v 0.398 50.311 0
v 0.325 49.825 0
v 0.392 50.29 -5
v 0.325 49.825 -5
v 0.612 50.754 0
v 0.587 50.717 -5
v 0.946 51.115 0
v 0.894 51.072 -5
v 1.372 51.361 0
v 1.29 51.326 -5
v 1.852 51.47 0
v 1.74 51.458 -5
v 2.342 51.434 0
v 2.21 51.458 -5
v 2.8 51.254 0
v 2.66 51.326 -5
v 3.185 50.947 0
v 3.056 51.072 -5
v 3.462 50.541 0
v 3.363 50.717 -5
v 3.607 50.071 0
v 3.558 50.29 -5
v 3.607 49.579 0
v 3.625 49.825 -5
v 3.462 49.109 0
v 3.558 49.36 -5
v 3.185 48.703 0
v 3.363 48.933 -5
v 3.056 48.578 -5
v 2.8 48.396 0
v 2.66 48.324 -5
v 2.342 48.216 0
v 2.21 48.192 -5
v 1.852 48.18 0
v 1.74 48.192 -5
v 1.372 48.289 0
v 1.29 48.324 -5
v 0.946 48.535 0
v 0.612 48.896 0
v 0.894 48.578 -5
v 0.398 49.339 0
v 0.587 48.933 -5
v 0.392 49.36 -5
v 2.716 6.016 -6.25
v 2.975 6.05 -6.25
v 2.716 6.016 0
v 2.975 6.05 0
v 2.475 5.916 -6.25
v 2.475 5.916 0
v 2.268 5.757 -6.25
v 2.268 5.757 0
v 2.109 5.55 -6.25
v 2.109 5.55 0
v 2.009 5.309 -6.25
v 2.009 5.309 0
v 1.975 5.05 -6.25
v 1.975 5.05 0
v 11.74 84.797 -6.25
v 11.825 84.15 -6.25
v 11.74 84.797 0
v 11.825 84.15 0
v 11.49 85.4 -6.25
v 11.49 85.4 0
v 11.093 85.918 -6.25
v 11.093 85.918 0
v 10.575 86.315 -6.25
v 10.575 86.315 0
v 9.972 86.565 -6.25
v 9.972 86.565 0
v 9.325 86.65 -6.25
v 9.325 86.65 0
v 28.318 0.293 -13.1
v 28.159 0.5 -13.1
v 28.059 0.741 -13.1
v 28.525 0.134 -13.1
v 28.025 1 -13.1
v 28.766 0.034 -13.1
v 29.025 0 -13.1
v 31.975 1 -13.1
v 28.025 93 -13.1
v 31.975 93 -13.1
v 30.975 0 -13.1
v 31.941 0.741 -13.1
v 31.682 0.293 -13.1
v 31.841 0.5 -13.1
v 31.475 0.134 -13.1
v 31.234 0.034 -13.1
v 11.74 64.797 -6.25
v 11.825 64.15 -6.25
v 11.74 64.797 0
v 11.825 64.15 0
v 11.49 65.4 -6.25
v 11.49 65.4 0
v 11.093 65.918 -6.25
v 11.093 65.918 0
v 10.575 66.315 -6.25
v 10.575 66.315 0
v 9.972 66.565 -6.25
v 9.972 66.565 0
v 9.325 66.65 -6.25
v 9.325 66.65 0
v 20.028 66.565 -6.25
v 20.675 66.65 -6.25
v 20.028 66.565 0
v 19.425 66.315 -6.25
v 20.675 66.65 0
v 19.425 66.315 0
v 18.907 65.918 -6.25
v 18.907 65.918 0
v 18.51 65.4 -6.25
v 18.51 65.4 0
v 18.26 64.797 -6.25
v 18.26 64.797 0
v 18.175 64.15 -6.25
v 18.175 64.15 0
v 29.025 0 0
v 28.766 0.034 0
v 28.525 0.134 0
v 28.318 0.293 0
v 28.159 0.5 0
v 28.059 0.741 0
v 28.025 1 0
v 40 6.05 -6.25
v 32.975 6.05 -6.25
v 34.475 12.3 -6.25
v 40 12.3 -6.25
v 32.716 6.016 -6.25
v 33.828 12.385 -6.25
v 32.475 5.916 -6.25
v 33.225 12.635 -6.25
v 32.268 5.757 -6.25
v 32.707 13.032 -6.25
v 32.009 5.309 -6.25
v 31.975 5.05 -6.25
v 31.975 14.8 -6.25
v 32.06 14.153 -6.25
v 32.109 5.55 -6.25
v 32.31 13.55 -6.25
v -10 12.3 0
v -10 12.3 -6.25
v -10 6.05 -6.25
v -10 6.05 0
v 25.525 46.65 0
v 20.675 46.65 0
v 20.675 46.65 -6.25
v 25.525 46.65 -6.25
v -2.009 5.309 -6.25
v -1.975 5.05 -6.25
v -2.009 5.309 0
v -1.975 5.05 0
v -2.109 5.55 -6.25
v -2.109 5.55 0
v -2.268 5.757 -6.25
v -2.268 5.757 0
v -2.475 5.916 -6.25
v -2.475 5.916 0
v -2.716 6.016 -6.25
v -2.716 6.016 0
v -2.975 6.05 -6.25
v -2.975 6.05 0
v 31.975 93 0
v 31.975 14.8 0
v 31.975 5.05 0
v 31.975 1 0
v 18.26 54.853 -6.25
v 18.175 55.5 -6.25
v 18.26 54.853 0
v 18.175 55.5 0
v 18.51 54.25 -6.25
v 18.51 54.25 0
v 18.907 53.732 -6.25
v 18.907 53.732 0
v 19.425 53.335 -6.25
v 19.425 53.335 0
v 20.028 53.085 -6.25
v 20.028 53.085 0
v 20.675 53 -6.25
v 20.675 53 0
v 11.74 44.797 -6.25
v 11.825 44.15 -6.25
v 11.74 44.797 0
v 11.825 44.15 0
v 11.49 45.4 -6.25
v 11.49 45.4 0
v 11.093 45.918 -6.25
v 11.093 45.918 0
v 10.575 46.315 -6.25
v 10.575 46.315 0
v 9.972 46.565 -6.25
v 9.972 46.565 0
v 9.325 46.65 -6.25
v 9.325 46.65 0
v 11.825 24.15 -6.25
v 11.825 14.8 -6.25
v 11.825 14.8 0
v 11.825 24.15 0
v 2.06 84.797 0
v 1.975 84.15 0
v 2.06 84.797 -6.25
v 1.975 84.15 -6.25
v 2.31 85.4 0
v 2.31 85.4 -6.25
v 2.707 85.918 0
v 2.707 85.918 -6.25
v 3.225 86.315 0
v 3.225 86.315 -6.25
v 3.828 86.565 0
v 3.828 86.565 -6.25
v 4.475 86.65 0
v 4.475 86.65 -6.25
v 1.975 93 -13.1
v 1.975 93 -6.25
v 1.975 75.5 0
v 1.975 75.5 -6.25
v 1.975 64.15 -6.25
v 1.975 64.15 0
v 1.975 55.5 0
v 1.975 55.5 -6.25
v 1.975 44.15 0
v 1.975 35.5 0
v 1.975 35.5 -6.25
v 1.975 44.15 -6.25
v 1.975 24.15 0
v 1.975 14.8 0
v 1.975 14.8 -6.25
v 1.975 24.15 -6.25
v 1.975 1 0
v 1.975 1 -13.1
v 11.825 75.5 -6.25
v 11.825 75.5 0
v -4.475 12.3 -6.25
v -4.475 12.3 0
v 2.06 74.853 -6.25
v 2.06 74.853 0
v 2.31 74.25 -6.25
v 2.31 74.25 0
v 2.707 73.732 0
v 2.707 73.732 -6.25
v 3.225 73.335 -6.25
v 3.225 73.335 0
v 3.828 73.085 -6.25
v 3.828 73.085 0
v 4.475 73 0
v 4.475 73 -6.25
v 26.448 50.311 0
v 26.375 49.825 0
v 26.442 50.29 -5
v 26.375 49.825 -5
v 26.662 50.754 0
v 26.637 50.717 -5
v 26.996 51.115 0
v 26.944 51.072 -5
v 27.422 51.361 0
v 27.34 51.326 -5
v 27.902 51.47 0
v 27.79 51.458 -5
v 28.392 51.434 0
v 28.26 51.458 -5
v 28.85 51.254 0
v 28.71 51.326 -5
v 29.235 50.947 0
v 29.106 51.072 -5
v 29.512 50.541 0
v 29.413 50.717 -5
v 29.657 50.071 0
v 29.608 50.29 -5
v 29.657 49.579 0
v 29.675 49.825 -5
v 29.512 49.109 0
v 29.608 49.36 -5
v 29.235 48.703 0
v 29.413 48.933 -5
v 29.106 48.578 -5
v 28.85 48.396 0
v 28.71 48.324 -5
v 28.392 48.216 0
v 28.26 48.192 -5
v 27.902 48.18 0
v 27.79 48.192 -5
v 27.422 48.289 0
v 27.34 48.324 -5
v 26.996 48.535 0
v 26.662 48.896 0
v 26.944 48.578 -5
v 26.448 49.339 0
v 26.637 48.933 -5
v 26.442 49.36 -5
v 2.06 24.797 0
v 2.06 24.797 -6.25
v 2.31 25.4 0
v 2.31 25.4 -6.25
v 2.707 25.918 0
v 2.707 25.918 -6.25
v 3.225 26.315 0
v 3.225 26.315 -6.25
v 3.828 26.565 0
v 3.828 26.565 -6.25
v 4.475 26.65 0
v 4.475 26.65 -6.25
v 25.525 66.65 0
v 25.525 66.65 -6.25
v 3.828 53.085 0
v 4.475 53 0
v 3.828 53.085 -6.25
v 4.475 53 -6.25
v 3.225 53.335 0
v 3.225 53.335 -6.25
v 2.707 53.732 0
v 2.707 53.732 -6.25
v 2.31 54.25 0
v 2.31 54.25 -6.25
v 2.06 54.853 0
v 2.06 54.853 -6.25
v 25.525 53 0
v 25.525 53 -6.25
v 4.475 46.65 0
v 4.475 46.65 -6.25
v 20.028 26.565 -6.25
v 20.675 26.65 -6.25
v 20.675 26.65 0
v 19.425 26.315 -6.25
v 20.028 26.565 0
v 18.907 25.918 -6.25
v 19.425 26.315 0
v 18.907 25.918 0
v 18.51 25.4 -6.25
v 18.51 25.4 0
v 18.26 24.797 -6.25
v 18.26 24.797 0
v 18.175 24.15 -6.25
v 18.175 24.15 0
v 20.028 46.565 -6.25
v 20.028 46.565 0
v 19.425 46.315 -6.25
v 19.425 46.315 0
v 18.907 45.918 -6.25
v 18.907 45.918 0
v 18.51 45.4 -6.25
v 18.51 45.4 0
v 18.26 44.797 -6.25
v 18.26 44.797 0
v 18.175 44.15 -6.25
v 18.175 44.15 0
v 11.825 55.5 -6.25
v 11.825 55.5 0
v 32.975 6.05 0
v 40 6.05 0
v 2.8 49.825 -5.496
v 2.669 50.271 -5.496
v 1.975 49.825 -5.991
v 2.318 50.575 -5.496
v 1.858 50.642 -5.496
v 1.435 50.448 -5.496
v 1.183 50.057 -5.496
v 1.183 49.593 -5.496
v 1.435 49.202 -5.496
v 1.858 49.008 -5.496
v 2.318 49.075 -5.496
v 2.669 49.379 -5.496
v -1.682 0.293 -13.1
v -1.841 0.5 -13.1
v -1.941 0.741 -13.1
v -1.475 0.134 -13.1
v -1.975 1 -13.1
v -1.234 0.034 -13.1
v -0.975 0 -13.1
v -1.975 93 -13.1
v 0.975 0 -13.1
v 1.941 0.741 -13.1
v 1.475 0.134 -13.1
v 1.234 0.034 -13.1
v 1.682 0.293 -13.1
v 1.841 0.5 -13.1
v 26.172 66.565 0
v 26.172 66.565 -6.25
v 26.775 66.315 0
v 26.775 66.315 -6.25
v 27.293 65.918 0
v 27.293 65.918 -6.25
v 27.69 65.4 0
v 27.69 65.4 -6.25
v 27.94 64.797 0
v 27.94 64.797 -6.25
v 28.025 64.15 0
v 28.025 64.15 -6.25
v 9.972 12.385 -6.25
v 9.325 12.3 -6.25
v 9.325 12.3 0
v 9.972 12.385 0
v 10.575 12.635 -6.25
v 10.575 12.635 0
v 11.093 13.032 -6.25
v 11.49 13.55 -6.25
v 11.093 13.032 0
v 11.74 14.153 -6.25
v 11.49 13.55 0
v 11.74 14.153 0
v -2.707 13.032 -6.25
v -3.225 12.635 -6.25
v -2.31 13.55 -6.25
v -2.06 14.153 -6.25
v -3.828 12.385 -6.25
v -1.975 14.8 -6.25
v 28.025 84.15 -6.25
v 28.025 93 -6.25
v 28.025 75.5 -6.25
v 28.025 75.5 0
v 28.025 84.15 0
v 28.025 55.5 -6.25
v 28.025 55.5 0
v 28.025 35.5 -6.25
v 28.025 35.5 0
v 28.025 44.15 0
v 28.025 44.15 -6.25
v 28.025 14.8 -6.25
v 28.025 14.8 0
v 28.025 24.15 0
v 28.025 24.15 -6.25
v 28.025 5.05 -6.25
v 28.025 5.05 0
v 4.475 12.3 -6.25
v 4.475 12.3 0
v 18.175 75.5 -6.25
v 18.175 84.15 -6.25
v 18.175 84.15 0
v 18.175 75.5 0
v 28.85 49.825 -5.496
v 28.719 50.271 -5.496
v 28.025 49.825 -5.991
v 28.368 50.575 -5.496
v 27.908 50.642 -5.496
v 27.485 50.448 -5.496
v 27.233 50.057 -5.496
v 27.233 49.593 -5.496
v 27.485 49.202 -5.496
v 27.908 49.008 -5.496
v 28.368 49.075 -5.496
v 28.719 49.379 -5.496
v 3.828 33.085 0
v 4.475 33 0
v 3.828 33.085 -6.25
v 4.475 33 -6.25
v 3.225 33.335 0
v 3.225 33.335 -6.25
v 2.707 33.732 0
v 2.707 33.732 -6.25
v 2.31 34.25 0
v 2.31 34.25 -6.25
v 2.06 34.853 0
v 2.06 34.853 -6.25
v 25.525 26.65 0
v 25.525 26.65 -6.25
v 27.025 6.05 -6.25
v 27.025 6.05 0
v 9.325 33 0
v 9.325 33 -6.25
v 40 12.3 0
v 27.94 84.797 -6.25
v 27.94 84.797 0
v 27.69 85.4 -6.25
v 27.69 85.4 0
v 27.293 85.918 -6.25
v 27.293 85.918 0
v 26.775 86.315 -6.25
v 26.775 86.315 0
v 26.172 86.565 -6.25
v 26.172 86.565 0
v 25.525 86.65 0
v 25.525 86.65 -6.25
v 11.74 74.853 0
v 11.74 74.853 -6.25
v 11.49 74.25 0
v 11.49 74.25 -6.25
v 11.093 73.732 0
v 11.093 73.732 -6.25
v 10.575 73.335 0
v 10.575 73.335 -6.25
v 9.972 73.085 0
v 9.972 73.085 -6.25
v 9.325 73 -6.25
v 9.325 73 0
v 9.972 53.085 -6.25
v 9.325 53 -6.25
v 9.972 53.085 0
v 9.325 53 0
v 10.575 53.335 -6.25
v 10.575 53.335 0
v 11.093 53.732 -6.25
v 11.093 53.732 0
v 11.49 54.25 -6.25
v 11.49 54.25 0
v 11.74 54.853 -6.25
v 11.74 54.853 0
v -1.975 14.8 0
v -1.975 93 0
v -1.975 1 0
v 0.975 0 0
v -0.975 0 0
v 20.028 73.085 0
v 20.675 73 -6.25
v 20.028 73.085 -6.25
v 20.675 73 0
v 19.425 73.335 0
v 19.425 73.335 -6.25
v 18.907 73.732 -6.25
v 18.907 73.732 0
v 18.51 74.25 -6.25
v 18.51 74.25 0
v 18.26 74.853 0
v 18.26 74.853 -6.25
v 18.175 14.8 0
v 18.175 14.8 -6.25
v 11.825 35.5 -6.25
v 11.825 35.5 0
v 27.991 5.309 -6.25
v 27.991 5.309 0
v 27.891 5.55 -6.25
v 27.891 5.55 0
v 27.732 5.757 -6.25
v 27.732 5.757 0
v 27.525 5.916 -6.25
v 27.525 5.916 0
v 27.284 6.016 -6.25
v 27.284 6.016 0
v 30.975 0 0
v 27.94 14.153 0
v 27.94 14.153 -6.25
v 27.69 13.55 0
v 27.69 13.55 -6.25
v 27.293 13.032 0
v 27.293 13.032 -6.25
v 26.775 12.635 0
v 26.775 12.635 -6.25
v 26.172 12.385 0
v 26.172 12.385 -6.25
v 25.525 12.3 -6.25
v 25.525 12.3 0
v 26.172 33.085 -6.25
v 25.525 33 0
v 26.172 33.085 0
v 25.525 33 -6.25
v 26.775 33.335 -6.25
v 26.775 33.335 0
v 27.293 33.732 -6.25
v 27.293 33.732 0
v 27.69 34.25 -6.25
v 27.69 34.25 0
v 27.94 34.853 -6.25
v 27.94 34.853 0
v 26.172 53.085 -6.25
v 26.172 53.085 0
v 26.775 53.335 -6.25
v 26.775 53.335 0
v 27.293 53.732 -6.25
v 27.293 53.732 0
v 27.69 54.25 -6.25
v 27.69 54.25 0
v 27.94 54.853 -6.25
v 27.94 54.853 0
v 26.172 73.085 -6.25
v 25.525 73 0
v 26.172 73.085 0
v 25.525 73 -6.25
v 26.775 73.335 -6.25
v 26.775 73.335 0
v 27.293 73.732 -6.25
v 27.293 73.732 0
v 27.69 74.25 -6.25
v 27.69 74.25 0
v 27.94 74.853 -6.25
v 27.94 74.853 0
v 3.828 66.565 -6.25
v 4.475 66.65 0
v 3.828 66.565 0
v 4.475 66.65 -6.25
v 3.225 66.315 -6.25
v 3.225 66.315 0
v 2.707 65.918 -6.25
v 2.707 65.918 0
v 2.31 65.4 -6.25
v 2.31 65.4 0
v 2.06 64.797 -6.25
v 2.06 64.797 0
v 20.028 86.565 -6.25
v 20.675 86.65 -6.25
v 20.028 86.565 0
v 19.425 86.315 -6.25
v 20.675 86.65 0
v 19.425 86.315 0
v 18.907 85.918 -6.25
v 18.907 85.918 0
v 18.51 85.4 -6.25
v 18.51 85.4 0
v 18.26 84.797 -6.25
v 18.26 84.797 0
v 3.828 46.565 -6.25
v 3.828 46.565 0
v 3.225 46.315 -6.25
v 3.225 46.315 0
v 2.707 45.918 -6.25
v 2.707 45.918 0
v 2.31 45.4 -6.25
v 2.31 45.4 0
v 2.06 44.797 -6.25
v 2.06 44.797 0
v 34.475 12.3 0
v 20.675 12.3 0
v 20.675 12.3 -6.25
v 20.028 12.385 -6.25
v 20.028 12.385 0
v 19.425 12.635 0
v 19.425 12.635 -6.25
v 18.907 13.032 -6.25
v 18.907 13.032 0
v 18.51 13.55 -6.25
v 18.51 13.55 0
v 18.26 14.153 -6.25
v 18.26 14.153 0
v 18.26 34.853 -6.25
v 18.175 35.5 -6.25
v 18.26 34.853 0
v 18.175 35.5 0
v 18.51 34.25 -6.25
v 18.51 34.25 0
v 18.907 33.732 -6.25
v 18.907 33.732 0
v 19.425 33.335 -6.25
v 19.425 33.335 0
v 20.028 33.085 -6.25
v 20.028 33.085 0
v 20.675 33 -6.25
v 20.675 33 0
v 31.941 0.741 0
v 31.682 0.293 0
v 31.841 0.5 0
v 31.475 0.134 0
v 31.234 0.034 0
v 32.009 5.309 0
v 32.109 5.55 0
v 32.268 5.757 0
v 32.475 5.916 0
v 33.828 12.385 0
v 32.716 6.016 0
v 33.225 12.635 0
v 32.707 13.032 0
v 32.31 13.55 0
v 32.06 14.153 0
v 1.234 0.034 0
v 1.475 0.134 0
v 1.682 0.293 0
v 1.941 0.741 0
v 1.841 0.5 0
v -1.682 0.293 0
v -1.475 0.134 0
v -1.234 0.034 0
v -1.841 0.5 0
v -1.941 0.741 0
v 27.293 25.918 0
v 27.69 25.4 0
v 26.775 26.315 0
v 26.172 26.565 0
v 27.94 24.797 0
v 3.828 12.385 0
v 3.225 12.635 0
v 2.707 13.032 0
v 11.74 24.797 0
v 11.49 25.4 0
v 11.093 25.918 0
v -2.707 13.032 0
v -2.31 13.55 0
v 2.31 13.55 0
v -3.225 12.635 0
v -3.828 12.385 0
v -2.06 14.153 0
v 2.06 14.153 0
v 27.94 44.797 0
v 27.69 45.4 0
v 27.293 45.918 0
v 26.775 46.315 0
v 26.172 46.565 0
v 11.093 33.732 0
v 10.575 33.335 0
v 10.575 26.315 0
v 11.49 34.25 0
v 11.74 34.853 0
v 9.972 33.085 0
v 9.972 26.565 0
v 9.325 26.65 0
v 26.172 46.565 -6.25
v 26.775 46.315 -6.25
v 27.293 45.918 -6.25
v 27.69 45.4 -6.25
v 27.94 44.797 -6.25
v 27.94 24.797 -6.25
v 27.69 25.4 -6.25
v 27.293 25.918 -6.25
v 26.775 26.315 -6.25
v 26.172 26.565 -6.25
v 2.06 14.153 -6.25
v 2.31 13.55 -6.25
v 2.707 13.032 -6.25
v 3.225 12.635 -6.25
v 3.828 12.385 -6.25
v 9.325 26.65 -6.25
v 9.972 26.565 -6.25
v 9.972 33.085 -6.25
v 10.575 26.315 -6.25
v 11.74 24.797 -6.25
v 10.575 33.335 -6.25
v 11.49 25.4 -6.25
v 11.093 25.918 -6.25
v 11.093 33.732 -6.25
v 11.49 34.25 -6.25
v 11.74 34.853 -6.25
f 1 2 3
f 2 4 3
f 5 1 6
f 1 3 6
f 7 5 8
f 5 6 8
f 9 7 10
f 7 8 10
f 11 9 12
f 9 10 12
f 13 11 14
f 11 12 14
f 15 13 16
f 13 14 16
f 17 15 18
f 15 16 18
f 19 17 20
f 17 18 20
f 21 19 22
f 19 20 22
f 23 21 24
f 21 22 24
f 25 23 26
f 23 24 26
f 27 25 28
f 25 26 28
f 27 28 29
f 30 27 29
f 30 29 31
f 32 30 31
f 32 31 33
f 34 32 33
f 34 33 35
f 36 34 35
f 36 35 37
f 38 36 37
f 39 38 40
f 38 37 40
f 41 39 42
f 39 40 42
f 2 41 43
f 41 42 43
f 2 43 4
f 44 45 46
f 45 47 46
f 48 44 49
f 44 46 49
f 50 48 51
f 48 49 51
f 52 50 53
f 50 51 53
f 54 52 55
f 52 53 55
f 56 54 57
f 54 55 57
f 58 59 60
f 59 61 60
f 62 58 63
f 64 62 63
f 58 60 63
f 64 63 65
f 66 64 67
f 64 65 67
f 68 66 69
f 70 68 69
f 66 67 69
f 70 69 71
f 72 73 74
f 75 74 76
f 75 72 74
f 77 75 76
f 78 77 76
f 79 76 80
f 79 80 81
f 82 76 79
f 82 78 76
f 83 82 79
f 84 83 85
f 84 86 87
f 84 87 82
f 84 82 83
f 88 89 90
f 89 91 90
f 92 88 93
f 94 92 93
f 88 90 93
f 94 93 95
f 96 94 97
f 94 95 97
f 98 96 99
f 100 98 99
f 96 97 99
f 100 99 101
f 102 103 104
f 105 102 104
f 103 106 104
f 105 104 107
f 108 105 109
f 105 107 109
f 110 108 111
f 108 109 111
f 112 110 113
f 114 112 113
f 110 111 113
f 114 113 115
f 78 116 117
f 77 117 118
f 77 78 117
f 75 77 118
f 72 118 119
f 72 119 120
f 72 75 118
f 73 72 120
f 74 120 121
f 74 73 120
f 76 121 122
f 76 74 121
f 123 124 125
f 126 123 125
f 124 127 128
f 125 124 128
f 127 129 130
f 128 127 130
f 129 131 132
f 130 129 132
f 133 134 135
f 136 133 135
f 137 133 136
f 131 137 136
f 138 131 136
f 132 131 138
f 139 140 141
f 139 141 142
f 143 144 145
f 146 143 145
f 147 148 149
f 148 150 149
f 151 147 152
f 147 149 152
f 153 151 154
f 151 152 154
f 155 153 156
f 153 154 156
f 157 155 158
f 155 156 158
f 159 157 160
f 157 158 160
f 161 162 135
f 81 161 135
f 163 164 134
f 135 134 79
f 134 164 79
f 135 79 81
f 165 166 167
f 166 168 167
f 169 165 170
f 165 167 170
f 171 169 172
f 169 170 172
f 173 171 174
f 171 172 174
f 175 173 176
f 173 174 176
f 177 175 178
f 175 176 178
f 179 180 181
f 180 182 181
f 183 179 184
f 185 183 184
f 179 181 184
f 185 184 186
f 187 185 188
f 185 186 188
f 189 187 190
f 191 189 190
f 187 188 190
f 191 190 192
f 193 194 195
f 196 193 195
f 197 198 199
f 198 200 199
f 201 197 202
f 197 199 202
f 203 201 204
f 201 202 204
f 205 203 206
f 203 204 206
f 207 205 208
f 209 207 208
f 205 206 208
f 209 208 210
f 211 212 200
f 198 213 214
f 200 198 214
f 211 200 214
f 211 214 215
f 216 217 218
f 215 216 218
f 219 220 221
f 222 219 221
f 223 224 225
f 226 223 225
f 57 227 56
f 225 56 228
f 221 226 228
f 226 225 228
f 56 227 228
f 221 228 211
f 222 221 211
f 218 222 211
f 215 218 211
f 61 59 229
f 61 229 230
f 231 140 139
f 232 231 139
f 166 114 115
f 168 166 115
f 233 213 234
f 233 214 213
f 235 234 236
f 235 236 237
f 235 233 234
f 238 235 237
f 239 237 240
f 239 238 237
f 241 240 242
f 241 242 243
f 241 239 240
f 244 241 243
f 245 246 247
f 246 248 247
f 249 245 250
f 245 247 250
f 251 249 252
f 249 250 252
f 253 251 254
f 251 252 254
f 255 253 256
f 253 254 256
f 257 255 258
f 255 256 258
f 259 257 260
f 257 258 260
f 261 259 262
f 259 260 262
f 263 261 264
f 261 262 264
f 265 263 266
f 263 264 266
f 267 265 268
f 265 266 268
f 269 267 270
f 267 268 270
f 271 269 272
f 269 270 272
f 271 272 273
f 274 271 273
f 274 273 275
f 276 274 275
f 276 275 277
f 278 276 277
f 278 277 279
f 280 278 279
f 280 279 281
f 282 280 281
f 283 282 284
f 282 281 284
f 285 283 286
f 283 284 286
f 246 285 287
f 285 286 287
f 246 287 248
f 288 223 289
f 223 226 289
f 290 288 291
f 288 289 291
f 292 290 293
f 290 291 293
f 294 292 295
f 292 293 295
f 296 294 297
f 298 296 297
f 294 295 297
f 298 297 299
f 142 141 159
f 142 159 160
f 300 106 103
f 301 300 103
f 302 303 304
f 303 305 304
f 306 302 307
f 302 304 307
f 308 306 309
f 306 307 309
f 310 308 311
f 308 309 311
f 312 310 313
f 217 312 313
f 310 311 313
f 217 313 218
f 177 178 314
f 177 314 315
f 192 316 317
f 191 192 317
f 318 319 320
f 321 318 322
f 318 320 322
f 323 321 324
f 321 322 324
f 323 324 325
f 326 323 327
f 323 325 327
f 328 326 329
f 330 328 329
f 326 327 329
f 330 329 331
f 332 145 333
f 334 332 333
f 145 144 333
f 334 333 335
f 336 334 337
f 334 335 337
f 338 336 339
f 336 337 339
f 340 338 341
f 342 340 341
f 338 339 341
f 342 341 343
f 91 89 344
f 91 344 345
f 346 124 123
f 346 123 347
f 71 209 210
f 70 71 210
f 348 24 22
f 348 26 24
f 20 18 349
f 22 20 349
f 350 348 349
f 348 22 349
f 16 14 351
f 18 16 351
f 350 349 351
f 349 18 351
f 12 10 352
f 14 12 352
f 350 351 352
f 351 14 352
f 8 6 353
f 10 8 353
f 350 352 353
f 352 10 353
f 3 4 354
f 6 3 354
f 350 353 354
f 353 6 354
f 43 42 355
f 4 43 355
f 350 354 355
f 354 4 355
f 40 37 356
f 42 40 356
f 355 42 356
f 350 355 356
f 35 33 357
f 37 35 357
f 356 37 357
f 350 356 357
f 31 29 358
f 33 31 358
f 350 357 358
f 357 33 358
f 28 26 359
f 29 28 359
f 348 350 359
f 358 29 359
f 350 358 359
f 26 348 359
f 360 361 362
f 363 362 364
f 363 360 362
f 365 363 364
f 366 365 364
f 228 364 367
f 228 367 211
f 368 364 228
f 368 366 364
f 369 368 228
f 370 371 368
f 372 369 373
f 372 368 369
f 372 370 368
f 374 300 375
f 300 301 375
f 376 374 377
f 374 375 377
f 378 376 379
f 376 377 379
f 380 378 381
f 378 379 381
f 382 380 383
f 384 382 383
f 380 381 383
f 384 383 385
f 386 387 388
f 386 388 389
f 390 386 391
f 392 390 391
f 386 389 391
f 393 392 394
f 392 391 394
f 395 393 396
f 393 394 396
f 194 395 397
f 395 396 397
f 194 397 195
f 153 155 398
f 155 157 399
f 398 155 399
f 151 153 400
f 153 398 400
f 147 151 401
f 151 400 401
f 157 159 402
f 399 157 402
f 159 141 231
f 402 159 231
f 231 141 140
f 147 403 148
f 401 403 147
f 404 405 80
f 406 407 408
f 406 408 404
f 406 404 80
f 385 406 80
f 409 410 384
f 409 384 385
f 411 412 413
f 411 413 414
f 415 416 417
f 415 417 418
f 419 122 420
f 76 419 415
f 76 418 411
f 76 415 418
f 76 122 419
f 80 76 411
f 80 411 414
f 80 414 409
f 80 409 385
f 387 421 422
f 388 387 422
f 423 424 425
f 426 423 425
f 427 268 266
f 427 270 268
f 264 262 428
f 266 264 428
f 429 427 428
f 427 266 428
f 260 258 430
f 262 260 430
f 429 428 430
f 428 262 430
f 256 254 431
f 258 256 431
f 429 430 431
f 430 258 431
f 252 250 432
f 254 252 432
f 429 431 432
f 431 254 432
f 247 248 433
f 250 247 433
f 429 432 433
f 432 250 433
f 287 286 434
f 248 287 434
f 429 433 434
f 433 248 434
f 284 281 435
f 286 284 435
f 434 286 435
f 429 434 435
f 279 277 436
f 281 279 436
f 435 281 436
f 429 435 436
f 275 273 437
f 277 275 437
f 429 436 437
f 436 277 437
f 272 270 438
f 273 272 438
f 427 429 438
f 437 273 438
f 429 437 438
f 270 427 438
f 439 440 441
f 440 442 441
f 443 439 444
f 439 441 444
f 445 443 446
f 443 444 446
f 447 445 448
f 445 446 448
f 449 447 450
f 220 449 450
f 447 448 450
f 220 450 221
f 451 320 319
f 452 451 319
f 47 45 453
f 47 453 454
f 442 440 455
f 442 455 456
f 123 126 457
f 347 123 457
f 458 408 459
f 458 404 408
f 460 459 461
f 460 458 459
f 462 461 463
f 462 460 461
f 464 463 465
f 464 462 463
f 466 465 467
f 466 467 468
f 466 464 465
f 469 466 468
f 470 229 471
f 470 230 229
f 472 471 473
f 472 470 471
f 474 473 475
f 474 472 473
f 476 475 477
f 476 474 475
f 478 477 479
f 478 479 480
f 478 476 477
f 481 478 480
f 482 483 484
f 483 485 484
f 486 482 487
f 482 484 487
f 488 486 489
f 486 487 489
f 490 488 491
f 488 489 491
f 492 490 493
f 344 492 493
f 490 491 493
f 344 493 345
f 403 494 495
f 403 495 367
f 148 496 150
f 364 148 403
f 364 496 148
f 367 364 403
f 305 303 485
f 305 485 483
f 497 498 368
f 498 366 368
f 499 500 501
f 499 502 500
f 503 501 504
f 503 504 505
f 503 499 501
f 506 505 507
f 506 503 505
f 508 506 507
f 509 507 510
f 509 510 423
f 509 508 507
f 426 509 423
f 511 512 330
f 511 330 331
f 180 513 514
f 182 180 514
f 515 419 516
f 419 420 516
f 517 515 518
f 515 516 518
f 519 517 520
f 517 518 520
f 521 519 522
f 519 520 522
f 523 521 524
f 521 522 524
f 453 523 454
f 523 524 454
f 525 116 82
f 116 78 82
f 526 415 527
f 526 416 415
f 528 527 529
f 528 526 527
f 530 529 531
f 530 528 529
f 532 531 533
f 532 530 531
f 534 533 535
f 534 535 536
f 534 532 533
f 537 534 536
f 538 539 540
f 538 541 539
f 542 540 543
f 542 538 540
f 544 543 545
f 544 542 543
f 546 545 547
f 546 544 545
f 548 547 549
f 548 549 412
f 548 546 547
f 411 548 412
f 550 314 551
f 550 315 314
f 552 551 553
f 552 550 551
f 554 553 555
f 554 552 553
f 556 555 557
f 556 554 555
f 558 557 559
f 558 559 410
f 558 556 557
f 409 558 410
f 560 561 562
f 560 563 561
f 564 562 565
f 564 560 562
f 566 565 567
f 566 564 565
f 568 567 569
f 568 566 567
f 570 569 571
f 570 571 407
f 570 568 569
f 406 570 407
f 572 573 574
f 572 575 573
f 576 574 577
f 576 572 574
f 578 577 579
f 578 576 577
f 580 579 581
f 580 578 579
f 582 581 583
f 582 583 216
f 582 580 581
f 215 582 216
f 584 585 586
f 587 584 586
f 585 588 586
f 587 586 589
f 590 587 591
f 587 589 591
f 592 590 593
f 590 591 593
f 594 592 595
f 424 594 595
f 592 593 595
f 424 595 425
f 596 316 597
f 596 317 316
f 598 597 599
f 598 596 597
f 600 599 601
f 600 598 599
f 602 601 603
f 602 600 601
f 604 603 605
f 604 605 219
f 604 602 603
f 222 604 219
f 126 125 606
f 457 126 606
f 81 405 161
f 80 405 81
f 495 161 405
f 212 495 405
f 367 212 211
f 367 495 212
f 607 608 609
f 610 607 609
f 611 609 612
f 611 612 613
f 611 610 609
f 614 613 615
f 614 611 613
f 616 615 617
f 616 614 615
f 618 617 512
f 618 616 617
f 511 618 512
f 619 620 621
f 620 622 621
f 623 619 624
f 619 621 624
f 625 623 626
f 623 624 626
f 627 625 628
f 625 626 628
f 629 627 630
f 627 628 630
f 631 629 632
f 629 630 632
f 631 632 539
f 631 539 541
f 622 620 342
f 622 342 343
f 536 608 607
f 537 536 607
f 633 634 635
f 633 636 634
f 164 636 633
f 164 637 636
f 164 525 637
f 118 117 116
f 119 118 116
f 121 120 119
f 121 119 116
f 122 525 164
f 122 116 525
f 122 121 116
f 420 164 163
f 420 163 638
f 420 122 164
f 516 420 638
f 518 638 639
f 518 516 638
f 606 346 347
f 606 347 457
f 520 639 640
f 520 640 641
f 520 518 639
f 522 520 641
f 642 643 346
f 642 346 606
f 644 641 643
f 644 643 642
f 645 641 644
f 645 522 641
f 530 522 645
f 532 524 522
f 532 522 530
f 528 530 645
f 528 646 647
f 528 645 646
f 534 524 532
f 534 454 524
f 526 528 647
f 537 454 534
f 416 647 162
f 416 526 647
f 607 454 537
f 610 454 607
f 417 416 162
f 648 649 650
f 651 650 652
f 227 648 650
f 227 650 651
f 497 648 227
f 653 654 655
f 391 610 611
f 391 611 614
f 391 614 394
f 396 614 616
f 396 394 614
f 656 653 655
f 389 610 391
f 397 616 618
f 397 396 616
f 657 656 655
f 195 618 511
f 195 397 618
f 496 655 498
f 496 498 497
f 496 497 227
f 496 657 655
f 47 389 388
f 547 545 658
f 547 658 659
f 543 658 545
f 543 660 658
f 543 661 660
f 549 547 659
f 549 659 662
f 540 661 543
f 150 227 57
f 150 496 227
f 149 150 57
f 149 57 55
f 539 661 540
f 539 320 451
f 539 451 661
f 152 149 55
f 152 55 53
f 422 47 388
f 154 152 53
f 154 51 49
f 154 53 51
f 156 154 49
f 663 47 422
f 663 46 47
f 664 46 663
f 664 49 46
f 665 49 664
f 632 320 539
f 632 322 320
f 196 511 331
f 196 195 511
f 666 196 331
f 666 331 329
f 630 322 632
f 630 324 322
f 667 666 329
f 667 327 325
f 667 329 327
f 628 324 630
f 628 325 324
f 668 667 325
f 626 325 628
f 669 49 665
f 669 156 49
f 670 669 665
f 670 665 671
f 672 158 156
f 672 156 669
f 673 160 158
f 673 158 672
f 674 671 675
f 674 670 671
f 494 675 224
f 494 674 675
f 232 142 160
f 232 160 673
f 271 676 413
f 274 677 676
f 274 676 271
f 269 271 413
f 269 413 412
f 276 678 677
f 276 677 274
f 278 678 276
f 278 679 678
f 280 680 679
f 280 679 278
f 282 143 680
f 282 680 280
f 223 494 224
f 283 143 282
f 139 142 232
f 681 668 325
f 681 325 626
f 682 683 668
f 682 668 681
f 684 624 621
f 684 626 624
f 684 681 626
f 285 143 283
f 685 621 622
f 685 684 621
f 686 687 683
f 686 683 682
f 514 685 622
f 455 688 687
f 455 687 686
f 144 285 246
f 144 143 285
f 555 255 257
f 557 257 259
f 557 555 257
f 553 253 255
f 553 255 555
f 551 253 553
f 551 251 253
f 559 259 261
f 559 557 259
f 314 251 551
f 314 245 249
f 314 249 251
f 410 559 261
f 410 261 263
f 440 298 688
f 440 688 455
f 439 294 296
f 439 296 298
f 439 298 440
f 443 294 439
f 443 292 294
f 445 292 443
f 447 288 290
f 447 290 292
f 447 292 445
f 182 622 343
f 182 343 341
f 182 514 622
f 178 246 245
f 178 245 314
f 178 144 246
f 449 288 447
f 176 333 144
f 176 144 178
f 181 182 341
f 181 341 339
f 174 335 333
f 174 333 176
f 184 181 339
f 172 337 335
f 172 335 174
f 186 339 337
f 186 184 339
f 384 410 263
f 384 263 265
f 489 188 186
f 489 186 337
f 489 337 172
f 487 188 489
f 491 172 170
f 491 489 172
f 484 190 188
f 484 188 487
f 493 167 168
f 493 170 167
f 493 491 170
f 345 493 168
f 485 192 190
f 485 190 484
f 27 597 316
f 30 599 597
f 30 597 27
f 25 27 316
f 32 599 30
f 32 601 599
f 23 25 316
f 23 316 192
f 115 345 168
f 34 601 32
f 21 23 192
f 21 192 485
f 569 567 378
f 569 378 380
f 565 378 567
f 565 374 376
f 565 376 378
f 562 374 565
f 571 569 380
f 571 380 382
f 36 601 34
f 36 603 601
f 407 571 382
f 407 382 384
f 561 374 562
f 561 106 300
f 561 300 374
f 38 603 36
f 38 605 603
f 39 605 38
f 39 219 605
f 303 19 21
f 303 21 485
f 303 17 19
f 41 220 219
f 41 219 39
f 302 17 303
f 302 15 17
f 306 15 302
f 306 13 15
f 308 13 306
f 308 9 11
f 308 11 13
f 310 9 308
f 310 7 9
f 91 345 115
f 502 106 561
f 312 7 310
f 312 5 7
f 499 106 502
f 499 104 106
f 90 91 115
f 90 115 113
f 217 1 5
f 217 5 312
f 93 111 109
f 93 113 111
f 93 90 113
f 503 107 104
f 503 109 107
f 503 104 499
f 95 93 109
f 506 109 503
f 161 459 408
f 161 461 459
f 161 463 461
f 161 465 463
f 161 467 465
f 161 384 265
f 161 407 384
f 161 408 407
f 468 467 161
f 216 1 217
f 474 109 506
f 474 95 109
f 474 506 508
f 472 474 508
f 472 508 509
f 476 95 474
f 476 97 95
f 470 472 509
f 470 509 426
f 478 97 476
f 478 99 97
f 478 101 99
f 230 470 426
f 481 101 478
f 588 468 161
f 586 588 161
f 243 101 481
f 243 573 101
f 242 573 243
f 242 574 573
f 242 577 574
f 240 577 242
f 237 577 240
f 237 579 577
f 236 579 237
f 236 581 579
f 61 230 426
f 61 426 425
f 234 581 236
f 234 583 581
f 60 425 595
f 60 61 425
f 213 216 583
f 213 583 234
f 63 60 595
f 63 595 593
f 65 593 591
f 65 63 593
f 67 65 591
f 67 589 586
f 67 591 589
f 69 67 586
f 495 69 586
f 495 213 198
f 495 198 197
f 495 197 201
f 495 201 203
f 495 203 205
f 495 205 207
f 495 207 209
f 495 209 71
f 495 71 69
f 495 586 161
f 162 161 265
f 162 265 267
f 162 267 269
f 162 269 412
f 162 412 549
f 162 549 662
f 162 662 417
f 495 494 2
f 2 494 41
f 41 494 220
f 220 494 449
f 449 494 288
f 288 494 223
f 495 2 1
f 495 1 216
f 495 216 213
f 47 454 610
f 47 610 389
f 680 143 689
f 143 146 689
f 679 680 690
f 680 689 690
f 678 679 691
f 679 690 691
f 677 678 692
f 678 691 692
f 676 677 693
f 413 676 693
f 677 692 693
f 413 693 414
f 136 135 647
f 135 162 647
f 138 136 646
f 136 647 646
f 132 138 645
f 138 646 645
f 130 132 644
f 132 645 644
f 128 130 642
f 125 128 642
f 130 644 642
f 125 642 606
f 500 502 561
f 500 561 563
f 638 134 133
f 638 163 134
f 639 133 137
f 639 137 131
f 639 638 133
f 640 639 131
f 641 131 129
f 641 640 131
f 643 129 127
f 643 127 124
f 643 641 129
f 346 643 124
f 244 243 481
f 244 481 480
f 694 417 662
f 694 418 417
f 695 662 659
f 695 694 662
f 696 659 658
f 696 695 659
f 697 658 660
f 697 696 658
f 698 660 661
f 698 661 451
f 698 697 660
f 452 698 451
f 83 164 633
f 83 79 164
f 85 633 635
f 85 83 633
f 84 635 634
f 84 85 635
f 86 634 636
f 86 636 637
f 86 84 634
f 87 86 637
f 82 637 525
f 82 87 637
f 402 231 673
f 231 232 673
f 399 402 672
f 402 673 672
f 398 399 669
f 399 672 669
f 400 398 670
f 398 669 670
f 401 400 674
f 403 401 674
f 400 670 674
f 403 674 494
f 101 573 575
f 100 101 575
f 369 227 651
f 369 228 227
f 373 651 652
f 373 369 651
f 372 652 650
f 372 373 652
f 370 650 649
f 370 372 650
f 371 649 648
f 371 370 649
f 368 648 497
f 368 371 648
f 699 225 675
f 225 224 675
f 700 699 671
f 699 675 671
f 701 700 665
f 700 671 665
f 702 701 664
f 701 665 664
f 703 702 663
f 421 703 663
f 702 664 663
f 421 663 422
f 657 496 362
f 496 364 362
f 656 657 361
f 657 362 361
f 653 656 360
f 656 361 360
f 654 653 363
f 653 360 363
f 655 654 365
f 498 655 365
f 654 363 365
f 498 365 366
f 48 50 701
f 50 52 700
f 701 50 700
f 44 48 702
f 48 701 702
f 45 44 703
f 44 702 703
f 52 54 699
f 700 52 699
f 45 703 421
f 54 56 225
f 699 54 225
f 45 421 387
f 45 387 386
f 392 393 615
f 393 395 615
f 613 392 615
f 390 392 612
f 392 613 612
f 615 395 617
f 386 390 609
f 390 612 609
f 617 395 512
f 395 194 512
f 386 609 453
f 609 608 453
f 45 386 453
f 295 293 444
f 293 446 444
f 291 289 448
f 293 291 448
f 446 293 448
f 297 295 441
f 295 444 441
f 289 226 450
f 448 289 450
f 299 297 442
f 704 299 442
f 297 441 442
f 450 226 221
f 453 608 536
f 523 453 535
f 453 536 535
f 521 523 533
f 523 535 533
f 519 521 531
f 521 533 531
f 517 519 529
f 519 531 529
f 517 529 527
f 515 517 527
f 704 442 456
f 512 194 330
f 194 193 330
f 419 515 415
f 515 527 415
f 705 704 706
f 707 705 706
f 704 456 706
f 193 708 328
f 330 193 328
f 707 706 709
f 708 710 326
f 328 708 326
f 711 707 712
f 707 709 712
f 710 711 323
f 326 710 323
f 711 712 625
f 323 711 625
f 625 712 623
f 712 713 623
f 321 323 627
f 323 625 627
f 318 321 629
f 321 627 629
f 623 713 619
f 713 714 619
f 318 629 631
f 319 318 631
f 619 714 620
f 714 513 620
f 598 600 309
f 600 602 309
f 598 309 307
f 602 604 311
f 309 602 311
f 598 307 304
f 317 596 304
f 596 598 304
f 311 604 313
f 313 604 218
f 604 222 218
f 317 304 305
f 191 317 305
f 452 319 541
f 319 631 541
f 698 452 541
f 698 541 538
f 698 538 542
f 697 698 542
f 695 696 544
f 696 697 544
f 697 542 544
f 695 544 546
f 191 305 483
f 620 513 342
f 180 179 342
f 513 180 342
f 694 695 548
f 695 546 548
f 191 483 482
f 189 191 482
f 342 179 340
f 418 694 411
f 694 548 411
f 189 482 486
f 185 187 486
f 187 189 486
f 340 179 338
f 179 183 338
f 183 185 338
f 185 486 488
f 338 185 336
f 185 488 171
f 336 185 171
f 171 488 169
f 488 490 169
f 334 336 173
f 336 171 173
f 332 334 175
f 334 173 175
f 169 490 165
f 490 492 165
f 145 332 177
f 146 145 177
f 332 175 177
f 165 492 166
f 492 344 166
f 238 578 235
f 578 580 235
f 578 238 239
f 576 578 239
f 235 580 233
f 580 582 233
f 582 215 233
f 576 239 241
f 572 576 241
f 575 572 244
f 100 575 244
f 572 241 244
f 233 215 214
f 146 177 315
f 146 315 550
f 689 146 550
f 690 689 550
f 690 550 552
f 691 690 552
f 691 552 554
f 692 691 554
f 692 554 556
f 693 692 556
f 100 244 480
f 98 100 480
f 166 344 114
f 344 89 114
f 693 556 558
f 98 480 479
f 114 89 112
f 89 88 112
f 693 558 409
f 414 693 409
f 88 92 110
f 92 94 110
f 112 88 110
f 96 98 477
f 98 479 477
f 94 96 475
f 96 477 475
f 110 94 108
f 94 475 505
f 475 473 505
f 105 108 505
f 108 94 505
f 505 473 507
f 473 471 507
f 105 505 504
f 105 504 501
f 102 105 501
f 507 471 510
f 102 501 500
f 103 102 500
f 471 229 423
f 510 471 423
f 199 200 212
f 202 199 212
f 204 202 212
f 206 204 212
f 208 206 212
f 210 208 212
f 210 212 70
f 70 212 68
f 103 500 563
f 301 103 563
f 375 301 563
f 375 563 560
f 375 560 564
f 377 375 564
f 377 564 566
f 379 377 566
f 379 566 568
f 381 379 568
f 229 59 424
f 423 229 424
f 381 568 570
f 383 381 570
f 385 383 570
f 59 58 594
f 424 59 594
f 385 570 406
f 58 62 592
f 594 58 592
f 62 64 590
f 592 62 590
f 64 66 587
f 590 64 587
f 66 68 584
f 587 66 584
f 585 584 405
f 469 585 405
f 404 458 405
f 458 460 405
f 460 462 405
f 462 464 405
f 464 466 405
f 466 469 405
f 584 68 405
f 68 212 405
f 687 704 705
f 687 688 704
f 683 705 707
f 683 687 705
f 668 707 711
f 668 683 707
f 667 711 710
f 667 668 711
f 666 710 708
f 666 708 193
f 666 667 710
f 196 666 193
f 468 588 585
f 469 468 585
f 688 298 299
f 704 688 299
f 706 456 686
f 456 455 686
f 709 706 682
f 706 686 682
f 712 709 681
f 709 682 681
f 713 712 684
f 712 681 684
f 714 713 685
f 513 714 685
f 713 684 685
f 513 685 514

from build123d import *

# Parameters (mm, degrees)
SKETCH1_W                      = 3.95
SKETCH1_H                      = 13.1
BOSS_EXTRUDE1_DEPTH            = 93
SKETCH2_W                      = 3.95
SKETCH2_H                      = 13.1
BOSS_EXTRUDE2_DEPTH            = 93
SKETCH3_W                      = 6.25
SKETCH3_H                      = 6.35
BOSS_EXTRUDE3_DEPTH            = 30
LPATTERN1_COUNT                = 4
LPATTERN1_PITCH                = 20
SKETCH4_W                      = 6.35
SKETCH4_H                      = 6.25
BOSS_EXTRUDE4_DEPTH            = 60
FILLET1_R                      = 2.5
SKETCH5_W                      = 6.25
SKETCH5_H                      = 6.25
BOSS_EXTRUDE5_DEPTH            = 25
FILLET2_R                      = 2.5
FILLET3_R                      = 2.5
SKETCH6_W                      = 6.35
SKETCH6_H                      = 6.25
BOSS_EXTRUDE6_DEPTH            = 14.35
FILLET4_R                      = 2.5
F_3_3_3_3_DIAMETER_HOLE1_D     = 3.3
F_3_3_3_3_DIAMETER_HOLE1_DEPTH = 5
F_3_3_3_3_DIAMETER_HOLE1_TIP   = 0.991420021
FILLET5_R                      = 1
FILLET6_R                      = 1


with BuildPart() as part:
    # Sketch1 → Boss-Extrude1 (new body)
    with BuildSketch(Plane(origin=(0, 0, 0), x_dir=(1, 0, 0), z_dir=(0, 1, 0))):
        with Locations((0, 6.55)):
            Rectangle(SKETCH1_W, SKETCH1_H)
    extrude(amount=BOSS_EXTRUDE1_DEPTH)



with BuildPart() as body_2:
    # Sketch2 → Boss-Extrude2 (new body)
    with BuildSketch(Plane(origin=(0, 0, 0), x_dir=(1, 0, 0), z_dir=(0, 1, 0))):
        with Locations((30, 6.55)):
            Rectangle(SKETCH2_W, SKETCH2_H)
    extrude(amount=BOSS_EXTRUDE2_DEPTH)


with BuildPart() as part_1:
    add(part.part)

    add(body_2.part)  # Boss-Extrude3 merges body 2
    # Sketch3 → Boss-Extrude3 (add)
    with BuildSketch(Plane(origin=(1.975, 0, 0), x_dir=(0, 0, -1), z_dir=(1, 0, 0))):
        with Locations((3.125, 89.825)):
            Rectangle(SKETCH3_W, SKETCH3_H)
    boss_extrude3 = extrude(amount=BOSS_EXTRUDE3_DEPTH)

    # LPattern1: Boss-Extrude3 ×4
    with Locations(*[(0, -i * LPATTERN1_PITCH, 0) for i in range(1, LPATTERN1_COUNT)]):
        add(boss_extrude3)

    # Sketch4 → Boss-Extrude4 (add)
    with BuildSketch(Plane.XZ.offset(-86.65)):
        with Locations((15, -3.125)):
            Rectangle(SKETCH4_W, SKETCH4_H)
    extrude(amount=BOSS_EXTRUDE4_DEPTH)

    # Fillet1
    fillet1_edges = [part_1.edges().sort_by_distance(p)[0] for p in [
        (18.175, 66.65, -3.125),
        (18.175, 53, -3.125),
        (18.175, 73, -3.125),
        (18.175, 86.65, -3.125),
        (18.175, 46.65, -3.125),
        (11.825, 66.65, -3.125),
        (11.825, 53, -3.125),
        (11.825, 73, -3.125),
        (11.825, 86.65, -3.125),
        (11.825, 46.65, -3.125),
        (28.025, 86.65, -3.125),
        (1.975, 86.65, -3.125),
        (28.025, 66.65, -3.125),
        (28.025, 73, -3.125),
        (1.975, 66.65, -3.125),
        (1.975, 73, -3.125),
        (28.025, 46.65, -3.125),
        (28.025, 53, -3.125),
        (1.975, 46.65, -3.125),
        (1.975, 53, -3.125),
        (28.025, 33, -3.125),
        (1.975, 33, -3.125),
        (11.825, 33, -3.125),
        (18.175, 33, -3.125),
    ]]
    fillet(fillet1_edges, radius=FILLET1_R)

    # Sketch5 → Boss-Extrude5 (add, symmetric)
    with BuildSketch(Plane.ZY.offset(-15)):
        with Locations((-3.125, 9.175)):
            Rectangle(SKETCH5_W, SKETCH5_H)
    extrude(amount=BOSS_EXTRUDE5_DEPTH, both=True)

    # Fillet2
    fillet2_edges = [part_1.edges().sort_by_distance(p)[0] for p in [
        (1.975, 12.3, -3.125),
        (28.025, 12.3, -3.125),
        (28.025, 26.65, -3.125),
        (1.975, 26.65, -3.125),
    ]]
    fillet(fillet2_edges, radius=FILLET2_R)

    # Fillet3
    fillet3_edges = [part_1.edges().sort_by_distance(p)[0] for p in [
        (31.975, 12.3, -3.125),
        (-1.975, 12.3, -3.125),
    ]]
    fillet(fillet3_edges, radius=FILLET3_R)

    # Sketch6 → Boss-Extrude6 (add)
    with BuildSketch(Plane.XZ.offset(-26.65)):
        with Locations((15, -3.125)):
            Rectangle(SKETCH6_W, SKETCH6_H)
    extrude(amount=BOSS_EXTRUDE6_DEPTH)

    # Fillet4
    fillet4_edges = [part_1.edges().sort_by_distance(p)[0] for p in [
        (18.175, 26.65, -3.125),
        (11.825, 26.65, -3.125),
        (18.175, 12.3, -3.125),
        (11.825, 12.3, -3.125),
    ]]
    fillet(fillet4_edges, radius=FILLET4_R)

    # Ø3.3 (3.3) Diameter Hole1
    with Locations(Plane.XY):
        with Locations((28.025, 49.825), (1.975, 49.825)):
            Hole(F_3_3_3_3_DIAMETER_HOLE1_D / 2, depth=F_3_3_3_3_DIAMETER_HOLE1_DEPTH)
            with Locations((0, 0, -(F_3_3_3_3_DIAMETER_HOLE1_DEPTH + F_3_3_3_3_DIAMETER_HOLE1_TIP / 2))):  # 118° drill point
                Cone(0, F_3_3_3_3_DIAMETER_HOLE1_D / 2, F_3_3_3_3_DIAMETER_HOLE1_TIP, mode=Mode.SUBTRACT)

    # Fillet5
    fillet5_edges = [part_1.edges().sort_by_distance(p)[0] for p in [
        (28.025, 0, -6.55),
        (31.975, 0, -6.55),
        (1.975, 0, -6.55),
        (-1.975, 0, -6.55),
    ]]
    fillet(fillet5_edges, radius=FILLET5_R)

    # Fillet6
    fillet6_edges = [part_1.edges().sort_by_distance(p)[0] for p in [
        (31.975, 6.05, -3.125),
        (1.975, 6.05, -3.125),
        (28.025, 6.05, -3.125),
        (-1.975, 6.05, -3.125),
    ]]
    fillet(fillet6_edges, radius=FILLET6_R)


solid = part_1.part
